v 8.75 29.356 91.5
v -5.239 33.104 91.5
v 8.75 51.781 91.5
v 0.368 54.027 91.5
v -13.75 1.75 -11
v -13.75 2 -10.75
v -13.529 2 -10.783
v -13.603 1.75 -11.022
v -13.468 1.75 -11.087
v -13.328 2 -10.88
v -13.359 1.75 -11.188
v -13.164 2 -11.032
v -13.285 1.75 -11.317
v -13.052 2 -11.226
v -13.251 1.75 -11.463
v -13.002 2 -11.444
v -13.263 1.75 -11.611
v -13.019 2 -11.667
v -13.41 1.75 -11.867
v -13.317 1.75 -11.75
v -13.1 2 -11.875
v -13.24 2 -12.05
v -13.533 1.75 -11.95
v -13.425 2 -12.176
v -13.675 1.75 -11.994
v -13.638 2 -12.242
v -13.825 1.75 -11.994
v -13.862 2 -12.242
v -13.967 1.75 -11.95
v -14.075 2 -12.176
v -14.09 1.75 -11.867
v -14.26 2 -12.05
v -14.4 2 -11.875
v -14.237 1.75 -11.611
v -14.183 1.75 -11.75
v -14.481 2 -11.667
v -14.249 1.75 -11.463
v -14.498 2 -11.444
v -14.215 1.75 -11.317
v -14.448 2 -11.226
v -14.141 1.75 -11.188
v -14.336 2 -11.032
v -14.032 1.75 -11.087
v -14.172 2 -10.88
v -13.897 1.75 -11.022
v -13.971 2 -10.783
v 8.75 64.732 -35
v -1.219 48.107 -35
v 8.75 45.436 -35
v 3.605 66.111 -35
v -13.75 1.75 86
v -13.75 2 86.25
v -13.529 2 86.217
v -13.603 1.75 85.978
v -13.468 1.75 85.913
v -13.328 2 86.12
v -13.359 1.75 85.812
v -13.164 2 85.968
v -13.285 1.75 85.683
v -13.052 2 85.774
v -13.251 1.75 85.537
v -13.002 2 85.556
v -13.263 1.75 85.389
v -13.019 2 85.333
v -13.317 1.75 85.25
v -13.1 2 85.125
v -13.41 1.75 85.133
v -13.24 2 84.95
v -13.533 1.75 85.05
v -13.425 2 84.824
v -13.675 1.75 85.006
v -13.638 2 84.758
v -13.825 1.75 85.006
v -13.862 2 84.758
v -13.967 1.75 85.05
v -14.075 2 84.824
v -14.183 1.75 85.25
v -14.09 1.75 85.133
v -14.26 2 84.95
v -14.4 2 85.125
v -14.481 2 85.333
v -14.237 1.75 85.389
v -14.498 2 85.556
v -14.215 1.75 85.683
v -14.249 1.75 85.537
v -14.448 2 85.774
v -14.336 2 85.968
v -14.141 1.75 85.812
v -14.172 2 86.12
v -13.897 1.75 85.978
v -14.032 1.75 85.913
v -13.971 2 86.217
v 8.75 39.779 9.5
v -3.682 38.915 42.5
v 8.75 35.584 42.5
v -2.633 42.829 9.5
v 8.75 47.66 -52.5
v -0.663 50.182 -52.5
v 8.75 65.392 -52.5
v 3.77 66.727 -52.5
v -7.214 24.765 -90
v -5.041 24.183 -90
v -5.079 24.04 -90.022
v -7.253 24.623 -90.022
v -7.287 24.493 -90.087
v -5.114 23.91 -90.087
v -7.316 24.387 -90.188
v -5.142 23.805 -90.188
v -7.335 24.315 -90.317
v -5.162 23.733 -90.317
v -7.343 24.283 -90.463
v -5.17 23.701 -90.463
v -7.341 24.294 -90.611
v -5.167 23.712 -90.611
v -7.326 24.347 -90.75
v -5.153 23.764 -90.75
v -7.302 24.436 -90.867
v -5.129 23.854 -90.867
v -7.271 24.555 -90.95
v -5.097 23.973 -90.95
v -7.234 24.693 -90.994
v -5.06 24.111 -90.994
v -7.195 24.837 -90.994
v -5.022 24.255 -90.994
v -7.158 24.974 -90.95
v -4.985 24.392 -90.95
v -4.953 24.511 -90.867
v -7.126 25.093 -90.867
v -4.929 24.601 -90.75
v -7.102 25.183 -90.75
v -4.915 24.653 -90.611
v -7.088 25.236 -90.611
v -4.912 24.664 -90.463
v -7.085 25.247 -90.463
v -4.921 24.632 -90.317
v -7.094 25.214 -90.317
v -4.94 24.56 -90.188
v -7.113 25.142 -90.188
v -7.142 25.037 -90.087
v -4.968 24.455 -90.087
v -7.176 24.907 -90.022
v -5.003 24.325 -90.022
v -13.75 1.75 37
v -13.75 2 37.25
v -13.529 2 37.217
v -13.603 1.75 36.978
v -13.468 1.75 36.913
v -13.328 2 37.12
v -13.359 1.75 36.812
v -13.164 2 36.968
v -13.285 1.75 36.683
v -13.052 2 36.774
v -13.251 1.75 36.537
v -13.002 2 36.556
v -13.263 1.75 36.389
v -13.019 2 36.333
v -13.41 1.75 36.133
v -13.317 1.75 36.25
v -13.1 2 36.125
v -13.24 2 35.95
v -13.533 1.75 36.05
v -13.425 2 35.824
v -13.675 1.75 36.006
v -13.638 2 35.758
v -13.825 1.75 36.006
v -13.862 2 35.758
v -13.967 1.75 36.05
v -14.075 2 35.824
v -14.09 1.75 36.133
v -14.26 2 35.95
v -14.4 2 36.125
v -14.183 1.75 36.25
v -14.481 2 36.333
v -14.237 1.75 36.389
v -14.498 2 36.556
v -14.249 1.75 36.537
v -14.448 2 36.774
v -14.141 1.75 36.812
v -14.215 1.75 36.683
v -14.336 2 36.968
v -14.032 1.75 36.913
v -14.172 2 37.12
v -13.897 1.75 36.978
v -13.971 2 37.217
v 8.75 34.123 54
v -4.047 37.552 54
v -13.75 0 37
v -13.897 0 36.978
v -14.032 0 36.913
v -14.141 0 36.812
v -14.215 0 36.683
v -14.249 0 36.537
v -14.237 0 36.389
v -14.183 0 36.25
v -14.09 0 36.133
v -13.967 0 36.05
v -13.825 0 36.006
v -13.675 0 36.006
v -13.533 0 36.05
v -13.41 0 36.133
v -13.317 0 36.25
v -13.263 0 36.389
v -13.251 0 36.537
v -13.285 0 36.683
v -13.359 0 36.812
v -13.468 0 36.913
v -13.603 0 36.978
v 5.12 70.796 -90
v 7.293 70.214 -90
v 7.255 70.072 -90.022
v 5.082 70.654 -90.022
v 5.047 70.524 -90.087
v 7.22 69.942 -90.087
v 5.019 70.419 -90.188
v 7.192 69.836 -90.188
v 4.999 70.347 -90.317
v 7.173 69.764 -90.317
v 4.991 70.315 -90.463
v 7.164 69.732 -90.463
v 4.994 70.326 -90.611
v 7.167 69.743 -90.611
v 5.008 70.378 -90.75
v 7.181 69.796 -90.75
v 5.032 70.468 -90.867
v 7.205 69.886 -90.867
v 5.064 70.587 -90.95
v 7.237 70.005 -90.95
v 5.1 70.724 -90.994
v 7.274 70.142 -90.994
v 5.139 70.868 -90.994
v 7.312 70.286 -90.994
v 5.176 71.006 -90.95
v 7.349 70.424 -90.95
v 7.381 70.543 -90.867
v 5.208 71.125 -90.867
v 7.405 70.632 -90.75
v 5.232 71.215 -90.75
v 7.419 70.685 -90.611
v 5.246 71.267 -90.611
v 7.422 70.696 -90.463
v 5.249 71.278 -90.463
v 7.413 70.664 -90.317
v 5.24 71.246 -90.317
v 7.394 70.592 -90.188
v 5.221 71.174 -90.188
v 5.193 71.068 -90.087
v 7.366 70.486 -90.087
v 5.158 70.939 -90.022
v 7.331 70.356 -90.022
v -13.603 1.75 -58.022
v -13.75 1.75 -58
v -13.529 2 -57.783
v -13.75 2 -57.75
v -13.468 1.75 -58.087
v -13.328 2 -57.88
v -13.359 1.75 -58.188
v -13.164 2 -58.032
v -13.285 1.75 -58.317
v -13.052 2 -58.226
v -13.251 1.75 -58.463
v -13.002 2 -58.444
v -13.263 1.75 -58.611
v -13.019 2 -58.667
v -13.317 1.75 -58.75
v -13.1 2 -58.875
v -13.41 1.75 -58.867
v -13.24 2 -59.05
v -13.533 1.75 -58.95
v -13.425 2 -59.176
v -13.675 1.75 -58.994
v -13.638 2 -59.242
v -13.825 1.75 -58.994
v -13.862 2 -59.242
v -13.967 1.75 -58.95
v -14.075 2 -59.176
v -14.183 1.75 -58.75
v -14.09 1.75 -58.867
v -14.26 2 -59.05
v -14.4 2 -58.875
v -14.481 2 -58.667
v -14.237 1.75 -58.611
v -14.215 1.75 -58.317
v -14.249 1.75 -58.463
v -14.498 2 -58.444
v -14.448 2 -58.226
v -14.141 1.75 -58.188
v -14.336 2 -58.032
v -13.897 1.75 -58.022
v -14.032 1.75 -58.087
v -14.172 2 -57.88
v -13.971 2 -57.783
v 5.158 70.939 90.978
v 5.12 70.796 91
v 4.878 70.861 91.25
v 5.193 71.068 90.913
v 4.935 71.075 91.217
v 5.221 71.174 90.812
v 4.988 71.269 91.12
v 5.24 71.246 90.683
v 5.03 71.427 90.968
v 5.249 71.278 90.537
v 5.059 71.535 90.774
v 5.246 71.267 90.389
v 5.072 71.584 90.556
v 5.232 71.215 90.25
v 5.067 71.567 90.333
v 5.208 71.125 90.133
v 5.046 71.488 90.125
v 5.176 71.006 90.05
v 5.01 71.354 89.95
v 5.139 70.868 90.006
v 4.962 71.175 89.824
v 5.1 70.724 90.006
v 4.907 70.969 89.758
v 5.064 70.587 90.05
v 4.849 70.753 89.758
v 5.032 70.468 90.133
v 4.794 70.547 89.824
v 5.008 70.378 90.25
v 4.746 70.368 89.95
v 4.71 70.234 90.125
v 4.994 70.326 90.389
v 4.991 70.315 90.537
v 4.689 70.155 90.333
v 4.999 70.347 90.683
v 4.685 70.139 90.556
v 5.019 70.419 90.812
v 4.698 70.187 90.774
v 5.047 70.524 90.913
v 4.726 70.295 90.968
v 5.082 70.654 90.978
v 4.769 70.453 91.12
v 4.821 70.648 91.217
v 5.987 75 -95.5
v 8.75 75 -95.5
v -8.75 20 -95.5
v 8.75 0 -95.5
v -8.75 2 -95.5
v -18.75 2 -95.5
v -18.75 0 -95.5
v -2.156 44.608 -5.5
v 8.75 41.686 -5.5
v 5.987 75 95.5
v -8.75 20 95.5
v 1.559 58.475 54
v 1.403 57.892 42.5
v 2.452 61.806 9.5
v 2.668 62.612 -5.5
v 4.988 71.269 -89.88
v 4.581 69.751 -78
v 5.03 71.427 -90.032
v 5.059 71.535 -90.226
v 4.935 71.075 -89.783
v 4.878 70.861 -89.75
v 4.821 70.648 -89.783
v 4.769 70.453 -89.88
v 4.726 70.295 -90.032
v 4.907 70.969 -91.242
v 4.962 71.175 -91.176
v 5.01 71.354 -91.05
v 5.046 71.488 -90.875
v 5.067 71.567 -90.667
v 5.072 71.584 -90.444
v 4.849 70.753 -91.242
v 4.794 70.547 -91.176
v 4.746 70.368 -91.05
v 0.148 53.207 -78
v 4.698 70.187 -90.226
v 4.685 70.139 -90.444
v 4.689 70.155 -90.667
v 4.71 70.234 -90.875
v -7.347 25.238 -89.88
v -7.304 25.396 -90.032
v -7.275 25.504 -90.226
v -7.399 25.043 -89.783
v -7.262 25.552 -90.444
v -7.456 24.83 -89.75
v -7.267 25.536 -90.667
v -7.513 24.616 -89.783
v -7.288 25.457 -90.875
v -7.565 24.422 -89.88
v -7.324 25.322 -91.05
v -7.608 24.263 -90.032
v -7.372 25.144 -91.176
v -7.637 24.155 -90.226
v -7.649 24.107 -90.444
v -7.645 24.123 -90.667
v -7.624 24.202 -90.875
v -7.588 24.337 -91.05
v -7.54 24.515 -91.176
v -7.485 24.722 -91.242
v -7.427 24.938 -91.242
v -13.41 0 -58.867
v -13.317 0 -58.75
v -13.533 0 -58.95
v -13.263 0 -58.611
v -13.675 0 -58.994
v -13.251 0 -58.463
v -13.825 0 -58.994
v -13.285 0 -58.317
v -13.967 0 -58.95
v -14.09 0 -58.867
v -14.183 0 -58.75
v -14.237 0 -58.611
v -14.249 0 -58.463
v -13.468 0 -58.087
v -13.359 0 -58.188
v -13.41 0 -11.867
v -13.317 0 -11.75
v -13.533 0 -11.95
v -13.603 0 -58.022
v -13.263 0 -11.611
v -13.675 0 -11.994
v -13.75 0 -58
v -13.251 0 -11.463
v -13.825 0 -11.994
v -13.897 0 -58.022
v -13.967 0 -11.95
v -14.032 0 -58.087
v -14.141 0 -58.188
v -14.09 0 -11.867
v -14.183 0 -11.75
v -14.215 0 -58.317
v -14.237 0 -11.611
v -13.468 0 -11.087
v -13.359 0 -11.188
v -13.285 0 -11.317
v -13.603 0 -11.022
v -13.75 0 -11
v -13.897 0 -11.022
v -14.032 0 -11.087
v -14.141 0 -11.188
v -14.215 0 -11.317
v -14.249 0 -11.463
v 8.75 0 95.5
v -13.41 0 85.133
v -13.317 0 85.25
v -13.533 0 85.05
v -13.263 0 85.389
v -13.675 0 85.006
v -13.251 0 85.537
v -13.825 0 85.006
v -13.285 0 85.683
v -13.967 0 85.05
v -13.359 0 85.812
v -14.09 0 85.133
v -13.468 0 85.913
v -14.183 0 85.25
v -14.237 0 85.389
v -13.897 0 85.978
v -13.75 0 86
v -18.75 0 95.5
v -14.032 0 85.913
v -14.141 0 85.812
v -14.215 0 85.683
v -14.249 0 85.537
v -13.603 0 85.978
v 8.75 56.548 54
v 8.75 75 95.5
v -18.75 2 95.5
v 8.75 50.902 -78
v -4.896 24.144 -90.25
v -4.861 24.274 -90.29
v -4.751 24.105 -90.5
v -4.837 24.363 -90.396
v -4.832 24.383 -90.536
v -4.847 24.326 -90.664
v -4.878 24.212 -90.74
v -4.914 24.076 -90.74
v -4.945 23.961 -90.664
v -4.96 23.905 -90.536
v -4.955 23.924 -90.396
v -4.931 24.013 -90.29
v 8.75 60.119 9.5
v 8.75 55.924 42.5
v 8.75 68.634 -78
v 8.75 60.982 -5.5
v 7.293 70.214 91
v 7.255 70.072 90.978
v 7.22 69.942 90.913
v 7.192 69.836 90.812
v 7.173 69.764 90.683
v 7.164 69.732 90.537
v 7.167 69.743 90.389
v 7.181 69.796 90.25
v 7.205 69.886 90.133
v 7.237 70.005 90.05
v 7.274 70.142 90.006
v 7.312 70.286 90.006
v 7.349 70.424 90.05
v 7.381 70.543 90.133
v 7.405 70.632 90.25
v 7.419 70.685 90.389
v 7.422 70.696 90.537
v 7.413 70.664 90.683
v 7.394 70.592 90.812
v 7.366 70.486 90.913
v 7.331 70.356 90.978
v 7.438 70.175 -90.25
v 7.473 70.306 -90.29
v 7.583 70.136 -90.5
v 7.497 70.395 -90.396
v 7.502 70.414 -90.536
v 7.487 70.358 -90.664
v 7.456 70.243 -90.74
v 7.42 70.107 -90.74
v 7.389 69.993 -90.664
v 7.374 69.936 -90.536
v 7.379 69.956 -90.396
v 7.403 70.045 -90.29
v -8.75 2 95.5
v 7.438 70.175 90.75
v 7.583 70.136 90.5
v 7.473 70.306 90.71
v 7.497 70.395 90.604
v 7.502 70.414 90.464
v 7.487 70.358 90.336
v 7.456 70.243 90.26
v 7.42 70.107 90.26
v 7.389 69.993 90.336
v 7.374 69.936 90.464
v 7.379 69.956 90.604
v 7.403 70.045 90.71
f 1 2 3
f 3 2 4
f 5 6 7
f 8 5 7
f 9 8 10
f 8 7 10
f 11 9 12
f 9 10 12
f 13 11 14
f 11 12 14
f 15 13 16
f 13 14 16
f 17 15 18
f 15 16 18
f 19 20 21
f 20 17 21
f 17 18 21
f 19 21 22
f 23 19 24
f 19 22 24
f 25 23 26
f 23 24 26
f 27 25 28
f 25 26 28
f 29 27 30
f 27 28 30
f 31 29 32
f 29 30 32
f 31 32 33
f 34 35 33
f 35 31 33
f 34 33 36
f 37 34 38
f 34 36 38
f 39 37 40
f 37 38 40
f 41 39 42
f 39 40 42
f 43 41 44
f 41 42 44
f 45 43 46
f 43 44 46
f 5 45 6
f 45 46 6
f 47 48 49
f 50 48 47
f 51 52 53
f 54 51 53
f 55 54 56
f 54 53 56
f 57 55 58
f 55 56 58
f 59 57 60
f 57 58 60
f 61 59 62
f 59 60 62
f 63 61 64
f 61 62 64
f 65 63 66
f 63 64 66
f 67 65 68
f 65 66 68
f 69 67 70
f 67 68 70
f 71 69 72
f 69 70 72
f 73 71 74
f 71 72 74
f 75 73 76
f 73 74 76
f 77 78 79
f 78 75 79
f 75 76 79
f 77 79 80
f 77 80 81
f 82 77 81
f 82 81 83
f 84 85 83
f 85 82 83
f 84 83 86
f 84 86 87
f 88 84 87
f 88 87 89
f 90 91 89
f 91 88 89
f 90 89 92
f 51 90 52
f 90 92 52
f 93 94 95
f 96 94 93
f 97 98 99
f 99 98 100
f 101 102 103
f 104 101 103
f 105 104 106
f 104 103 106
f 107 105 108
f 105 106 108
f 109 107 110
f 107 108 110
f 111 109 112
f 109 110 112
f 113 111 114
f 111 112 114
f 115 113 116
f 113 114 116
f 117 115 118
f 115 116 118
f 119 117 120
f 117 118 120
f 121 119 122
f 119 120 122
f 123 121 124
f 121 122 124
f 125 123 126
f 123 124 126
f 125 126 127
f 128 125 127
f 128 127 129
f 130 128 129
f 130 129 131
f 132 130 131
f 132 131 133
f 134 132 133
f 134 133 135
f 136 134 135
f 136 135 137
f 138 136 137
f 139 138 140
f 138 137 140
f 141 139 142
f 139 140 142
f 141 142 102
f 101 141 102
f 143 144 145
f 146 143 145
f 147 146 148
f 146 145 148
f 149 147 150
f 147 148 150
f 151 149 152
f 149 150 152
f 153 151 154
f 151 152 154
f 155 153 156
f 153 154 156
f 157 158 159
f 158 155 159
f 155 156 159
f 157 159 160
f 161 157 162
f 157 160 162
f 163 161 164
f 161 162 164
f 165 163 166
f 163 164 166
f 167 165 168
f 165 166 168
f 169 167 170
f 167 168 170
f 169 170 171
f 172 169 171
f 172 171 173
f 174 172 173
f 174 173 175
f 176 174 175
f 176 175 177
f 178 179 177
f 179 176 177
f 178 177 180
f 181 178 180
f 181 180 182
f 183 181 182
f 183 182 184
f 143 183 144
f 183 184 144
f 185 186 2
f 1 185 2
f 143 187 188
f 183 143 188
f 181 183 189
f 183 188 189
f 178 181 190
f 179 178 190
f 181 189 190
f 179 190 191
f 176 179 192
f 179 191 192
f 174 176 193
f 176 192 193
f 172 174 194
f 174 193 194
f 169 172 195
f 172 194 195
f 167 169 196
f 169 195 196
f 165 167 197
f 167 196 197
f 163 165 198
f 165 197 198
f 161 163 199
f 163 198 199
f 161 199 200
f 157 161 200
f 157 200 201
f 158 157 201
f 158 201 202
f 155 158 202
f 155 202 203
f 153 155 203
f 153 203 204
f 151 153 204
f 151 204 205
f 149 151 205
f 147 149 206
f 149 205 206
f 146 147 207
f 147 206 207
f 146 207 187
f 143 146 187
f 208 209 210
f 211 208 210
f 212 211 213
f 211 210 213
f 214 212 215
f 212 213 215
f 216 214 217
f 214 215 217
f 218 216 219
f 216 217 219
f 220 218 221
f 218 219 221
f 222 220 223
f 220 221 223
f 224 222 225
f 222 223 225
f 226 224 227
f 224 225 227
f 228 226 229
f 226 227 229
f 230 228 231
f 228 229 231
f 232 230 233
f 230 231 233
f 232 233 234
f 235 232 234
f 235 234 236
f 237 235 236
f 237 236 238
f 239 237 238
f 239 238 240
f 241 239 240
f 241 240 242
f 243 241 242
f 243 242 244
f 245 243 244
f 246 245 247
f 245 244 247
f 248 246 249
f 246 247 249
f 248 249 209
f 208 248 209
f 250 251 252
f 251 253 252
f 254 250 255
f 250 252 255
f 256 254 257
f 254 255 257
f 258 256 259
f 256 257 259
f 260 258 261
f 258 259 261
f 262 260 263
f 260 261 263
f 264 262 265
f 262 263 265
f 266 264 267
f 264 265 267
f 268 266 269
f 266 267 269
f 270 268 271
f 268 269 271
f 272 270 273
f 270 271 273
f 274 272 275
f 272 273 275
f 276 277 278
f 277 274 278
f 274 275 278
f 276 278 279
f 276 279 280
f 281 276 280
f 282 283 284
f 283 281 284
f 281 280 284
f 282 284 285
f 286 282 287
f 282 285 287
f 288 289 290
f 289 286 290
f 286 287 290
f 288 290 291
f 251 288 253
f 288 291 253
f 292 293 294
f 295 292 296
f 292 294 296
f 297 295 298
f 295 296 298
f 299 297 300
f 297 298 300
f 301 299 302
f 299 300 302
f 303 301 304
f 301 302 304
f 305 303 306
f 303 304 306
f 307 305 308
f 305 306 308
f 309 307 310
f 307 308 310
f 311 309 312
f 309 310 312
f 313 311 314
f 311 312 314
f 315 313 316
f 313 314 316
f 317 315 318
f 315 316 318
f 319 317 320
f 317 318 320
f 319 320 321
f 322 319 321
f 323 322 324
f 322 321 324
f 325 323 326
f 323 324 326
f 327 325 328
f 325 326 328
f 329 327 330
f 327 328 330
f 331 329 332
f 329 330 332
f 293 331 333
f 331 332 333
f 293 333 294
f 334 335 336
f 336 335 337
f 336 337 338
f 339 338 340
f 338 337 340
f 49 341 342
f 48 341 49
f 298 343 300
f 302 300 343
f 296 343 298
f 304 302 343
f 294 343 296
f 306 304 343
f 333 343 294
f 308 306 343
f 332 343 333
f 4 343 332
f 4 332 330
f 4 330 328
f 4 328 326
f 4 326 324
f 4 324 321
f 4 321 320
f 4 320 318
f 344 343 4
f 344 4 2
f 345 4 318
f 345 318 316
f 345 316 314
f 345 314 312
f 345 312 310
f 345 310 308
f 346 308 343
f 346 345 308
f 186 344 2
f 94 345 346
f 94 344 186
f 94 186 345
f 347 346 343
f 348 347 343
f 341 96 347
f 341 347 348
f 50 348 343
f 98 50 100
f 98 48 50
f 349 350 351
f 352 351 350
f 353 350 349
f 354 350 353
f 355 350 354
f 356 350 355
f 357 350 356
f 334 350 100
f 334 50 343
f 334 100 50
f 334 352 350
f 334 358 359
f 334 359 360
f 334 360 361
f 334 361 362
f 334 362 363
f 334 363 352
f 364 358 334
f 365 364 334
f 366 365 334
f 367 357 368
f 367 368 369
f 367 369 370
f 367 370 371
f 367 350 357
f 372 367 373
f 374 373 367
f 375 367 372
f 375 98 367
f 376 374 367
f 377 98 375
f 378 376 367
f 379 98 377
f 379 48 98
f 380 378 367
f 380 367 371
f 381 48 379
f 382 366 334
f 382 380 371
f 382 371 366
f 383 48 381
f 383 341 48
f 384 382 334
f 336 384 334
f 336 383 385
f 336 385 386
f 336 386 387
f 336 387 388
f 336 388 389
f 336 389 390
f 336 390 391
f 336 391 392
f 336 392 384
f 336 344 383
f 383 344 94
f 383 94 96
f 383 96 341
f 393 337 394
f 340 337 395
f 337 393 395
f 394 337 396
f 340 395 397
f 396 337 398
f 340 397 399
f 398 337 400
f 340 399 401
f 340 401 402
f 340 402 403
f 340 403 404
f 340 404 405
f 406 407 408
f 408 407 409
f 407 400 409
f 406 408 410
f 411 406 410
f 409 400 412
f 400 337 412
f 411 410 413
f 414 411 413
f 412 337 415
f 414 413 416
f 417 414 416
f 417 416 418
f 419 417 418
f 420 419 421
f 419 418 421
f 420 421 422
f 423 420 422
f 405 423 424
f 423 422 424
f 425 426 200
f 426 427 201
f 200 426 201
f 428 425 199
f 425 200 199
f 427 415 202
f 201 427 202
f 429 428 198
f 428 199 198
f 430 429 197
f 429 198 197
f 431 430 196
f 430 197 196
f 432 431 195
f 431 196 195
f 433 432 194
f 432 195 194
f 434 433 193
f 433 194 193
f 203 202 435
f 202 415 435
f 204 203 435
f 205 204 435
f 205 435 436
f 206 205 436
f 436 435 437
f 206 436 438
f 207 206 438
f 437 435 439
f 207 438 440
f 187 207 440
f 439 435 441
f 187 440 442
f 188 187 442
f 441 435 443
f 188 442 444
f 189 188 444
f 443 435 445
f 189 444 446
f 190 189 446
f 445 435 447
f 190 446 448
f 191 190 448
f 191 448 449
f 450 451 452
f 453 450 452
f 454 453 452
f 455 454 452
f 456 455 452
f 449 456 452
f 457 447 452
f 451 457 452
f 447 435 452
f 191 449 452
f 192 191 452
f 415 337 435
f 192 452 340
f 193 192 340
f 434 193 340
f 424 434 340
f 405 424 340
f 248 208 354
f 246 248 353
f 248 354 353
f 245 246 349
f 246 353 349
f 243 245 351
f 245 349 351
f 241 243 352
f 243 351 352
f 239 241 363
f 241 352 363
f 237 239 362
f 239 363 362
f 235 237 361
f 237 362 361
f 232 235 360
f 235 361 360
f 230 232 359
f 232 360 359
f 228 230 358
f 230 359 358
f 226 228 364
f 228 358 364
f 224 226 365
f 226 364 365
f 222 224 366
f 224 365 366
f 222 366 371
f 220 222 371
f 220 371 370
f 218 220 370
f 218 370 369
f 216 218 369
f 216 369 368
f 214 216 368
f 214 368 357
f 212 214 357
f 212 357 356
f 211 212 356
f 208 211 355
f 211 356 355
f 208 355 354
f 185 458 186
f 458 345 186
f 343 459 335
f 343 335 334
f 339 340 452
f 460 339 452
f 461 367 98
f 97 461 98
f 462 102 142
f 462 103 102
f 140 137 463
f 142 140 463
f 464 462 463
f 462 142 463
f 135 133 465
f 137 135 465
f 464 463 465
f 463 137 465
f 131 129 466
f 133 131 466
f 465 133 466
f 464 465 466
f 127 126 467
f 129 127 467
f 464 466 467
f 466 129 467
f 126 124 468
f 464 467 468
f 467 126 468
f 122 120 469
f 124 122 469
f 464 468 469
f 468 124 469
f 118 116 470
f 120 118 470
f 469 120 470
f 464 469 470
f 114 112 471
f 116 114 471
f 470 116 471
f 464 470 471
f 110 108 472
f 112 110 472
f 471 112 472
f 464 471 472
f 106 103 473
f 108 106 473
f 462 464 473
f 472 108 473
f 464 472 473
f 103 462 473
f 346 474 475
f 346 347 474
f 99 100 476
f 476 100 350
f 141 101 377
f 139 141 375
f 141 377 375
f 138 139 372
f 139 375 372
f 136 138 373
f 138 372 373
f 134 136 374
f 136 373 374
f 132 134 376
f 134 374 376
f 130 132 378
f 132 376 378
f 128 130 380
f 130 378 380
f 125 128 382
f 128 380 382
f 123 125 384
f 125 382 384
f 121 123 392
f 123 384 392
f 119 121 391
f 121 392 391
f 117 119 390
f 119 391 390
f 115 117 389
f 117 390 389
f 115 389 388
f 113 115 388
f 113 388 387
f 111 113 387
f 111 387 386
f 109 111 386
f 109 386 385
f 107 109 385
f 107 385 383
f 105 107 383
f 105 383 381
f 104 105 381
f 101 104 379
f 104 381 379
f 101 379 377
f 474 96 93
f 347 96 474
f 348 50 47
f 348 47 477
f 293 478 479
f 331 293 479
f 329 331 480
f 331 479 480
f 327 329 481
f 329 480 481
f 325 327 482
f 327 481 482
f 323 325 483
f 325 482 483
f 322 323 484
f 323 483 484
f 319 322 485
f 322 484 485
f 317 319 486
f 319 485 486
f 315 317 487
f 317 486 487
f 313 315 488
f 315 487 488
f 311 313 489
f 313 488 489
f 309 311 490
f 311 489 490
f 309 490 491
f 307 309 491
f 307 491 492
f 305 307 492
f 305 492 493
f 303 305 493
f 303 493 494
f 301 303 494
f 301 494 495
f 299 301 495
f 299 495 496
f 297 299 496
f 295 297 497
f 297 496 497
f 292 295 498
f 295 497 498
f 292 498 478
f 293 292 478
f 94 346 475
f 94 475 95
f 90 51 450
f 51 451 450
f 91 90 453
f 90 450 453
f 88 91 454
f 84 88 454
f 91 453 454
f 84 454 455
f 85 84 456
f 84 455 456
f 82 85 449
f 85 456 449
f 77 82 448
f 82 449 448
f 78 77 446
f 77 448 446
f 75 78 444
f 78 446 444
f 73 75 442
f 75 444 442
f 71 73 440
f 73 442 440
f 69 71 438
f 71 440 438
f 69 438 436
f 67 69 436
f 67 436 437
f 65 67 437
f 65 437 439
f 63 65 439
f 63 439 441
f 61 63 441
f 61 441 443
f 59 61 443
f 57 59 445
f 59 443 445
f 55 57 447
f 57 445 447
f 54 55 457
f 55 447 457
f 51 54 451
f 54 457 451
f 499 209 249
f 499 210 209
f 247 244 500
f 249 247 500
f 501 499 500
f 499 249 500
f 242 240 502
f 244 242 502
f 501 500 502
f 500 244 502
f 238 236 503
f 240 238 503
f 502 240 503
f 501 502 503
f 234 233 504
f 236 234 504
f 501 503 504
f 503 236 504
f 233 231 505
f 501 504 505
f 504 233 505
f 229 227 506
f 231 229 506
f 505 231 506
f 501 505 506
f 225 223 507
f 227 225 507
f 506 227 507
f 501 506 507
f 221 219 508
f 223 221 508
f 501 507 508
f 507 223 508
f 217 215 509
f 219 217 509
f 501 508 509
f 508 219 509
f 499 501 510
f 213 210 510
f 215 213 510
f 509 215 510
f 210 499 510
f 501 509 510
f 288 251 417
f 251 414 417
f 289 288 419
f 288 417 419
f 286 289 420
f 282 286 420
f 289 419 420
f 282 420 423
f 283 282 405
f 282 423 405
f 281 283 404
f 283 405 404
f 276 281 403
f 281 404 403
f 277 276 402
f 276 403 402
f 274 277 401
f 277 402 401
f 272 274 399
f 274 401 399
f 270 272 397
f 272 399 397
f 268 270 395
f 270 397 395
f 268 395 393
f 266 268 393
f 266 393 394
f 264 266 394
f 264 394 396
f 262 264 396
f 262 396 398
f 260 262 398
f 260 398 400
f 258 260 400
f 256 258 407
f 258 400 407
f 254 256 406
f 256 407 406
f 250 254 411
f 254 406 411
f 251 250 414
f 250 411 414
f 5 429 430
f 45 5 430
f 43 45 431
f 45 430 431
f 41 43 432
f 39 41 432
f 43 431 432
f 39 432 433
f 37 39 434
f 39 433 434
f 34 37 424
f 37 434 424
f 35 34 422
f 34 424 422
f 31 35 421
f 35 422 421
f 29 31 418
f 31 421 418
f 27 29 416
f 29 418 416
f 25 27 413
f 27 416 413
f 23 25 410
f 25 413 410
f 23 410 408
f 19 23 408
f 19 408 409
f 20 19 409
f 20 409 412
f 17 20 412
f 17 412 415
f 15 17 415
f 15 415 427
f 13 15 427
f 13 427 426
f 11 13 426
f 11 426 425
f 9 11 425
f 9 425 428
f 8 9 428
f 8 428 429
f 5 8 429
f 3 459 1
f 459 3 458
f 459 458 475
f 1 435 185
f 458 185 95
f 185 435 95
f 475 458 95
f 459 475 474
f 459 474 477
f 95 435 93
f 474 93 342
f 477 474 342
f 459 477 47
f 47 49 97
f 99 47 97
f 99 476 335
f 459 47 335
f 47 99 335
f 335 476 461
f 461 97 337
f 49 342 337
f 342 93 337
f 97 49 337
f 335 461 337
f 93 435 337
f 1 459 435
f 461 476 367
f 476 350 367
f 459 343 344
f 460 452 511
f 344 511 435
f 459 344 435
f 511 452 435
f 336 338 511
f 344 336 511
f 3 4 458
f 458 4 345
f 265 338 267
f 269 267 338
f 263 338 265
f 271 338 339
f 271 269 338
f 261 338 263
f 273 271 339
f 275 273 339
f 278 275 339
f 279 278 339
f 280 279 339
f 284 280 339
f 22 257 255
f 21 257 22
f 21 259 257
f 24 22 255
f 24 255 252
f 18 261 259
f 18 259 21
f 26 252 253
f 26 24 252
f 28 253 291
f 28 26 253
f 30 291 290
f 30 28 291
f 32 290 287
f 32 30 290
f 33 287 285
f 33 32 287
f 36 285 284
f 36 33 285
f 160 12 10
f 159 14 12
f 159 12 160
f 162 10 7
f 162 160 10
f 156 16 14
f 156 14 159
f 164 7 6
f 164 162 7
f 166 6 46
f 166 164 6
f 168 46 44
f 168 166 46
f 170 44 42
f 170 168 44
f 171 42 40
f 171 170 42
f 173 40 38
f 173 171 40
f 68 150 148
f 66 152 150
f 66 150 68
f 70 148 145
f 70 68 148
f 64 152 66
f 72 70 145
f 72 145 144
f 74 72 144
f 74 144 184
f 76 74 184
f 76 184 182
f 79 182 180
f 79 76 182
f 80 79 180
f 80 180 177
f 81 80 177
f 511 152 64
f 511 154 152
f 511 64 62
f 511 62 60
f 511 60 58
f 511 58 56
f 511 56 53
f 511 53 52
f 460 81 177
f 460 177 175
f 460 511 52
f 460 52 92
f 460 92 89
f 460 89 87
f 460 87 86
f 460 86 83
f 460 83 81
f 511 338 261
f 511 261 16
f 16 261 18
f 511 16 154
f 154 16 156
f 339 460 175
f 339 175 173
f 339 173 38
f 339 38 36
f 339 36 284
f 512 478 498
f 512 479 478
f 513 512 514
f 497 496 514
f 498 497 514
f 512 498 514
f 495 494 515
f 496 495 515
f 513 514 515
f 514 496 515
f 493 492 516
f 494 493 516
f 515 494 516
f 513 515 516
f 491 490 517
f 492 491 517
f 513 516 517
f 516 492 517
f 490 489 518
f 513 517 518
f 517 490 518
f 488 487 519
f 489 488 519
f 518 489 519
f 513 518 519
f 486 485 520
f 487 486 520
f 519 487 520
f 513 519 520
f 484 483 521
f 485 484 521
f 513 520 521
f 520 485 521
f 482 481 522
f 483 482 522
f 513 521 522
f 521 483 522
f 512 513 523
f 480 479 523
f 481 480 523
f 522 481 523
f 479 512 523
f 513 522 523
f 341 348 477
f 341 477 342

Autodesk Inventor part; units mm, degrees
ref_plane "YZ Plane" through (0, 0, 0) normal (1, 0, 0) x (0, 1, 0)
ref_plane "XZ Plane" through (0, 0, 0) normal (0, 1, 0) x (-1, 0, 0)
sketch "Эскиз1" plane through (0, 0, 0) normal (0, 1, 0) x (-1, 0, 0)
  line L0 (8.75, 95.5) -> (-8.75, 95.5)
  line L1 (-8.75, 95.5) -> (-8.75, -95.5)
  line L2 (-8.75, -95.5) -> (8.75, -95.5)
  line L3 (8.75, -95.5) -> (8.75, 95.5)
  line L4 (8.75, -95.5) -> (-8.75, 95.5) construction
  line L5 (-8.75, -95.5) -> (8.75, 95.5) construction
  point P0 (0, 0)
  point P1 (0, 0)
  dimension "d0" = 17.5
  dimension "d1" = 191
extrude "Выдавливание1" add sketch "Эскиз1" along normal blind 75
sketch "Эскиз2" plane through (-8.75, 0, -95.5) normal (-1, 0, 0) x (0, 0, 1)
  line L0 (191, 0) -> (191, 75) construction
  line L1 (191, 20) -> (0, 20)
  line L2 (0, 0) -> (0, 75) construction
  line L3 (0, 0) -> (191, 0) construction
  point P0 (95.5, 0)
  dimension "d4" = 20
ref_plane "РабПлоскость1" through (-8.75, 20, 95.5) normal (-0.9659258, 0.258819, 0) x (0, 0, -1)
split "Разделение1" plane through (-8.75, 20, 95.5) removes the side toward (-0.9659258, 0.258819, 0)
sketch "Эскиз3" plane through (5.9872, 75, -95.5) normal (-0.9659258, 0.258819, 0) x (0, 0, 1)
  line L0 (0, -56.9402) -> (0, 0) construction
  line L1 (0, 0) -> (191, 0) construction
  line L2 (191, 0) -> (191, -56.9402) construction
  line L3 (191, -56.9402) -> (0, -56.9402) construction
  line L4 (191, -71.7294) -> (191, 0.7151) construction
  line L5 (191, -53.9402) -> (0, -30.4883) construction
  line L6 (0, -71.7294) -> (0, 0.7151) construction
  line L7 (17.5, -22.562) -> (43, -25.693)
  line L8 (43, -25.693) -> (43, -8.5653)
  line L9 (43, -8.5653) -> (17.5, -5.4343)
  line L10 (17.5, -5.4343) -> (17.5, -22.562)
  line L11 (47, 0) -> (47, -56.9402) construction
  line L12 (191, -56.9402) -> (0, -56.9402) construction
  line L13 (94, 0) -> (94, -56.9402) construction
  line L14 (142, 0) -> (142, -56.9402) construction
  line L15 (43, -8.5653) -> (47, -8.5653) construction
  line L16 (60.5, -27.8417) -> (60.5, -9.2028)
  line L17 (60.5, -9.2028) -> (90, -12.8249)
  line L18 (90, -12.8249) -> (90, -31.4639)
  line L19 (90, -31.4639) -> (60.5, -27.8417)
  line L20 (90, -12.8249) -> (94, -12.8249) construction
  line L21 (105, -33.3056) -> (105, -13.6592)
  line L22 (105, -13.6592) -> (138, -17.7111)
  line L23 (138, -17.7111) -> (138, -37.3575)
  line L24 (138, -37.3575) -> (105, -33.3056)
  line L25 (138, -17.7111) -> (142, -17.7111) construction
  line L26 (149.5, -17.1081) -> (149.5, -38.7695)
  line L27 (149.5, -38.7695) -> (187, -43.374)
  line L28 (187, -43.374) -> (187, -21.7125)
  line L29 (187, -21.7125) -> (149.5, -17.1081)
  line L30 (187, -21.7125) -> (191, -21.7125) construction
  point P0 (95.5, -73.994)
  dimension "d6" = 3
  dimension "d7" = 7
  dimension "d8" = 10
  dimension "d9" = 25.5
  dimension "d10" = 27
  dimension "d11" = 4
  dimension "d12" = 29.5
  dimension "d13" = 28.5
  dimension "d14" = 33
  dimension "d15" = 29.5
  dimension "d16" = 37.5
  dimension "d17" = 31.5
  dimension "d36" = 49
  dimension "d37" = 48
  dimension "d38" = 47
extrude "Выдавливание2" cut sketch "Эскиз3" against normal through all
sketch "Эскиз5" plane through (0, 0, 0) normal (0, 1, 0) x (-1, 0, 0)
  line L0 (8.75, -95.5) -> (-8.75, -95.5) construction
  line L1 (-8.75, -95.5) -> (-8.75, 95.5) construction
  line L2 (-8.75, 95.5) -> (8.75, 95.5) construction
  line L3 (8.75, 95.5) -> (8.75, -95.5) projected
  line L4 (8.75, -95.5) -> (18.75, -95.5)
  line L5 (18.75, -95.5) -> (18.75, 85.5)
  line L6 (18.75, 95.5) -> (8.75, 95.5)
  line L7 (8.75, 95.5) -> (8.75, -95.5) construction
  line L8 (18.75, 85.5) -> (18.75, 95.5)
  line L9 (24.25, 0) -> (-14.25, 0) construction
  point P0 (0, 0)
  point P1 (8.75, 95.5)
  dimension "d26" = 10
extrude "Выдавливание5" add sketch "Эскиз5" along normal blind 2
sketch "Эскиз4" plane through (5.9872, 75, -95.5) normal (-0.9659258, 0.258819, 0) x (0, 0, 1)
  line L0 (191, 0.7151) -> (0, 0.7151) construction
  line L1 (95.5, 0.7151) -> (95.5, -56.9402) construction
  line L2 (191, -56.9402) -> (0, -56.9402) construction
  line L3 (191, -71.7294) -> (191, 0.7151) construction
  line L4 (0, -71.7294) -> (0, 0.7151) construction
  line L5 (191, -28.1126) -> (0, -28.1126) construction
  line L6 (191, -76.2587) -> (191, -56.9402) construction
  circle A0 centre (5, -51.9402) radius 0.5
  circle A1 centre (5, -4.2849) radius 0.5
  line L7 (0, -56.9402) -> (0, 0) projected
  line L8 (0, -56.9402) -> (10, -56.9402)
  line L9 (10, -56.9402) -> (10, -46.9402)
  line L10 (10, -46.9402) -> (0, -46.9402)
  line L11 (0, -46.9402) -> (0, -56.9402)
  line L12 (10, -56.9402) -> (0, -46.9402) construction
  line L13 (0, -56.9402) -> (10, -46.9402) construction
  circle A2 centre (186, -4.2849) radius 0.5
  point P0 (95.5, -73.994)
  point P1 (95.5, -28.1126)
  dimension "d46" = 10
  dimension "d47" = 1
hole "Отверстие1" at (-7.4559, 24.8296, -90.5) at (4.8782, 70.8611, -90.5) at (4.8782, 70.8611, 90.5) direction (0.9659258, -0.258819, 0) diameter 1 depth 2.5 tip angle 118 countersink diameter 1.5 countersink angle 90
sketch "Эскиз6" plane through (0, 2, 0) normal (0, 1, 0) x (1, 0, 0)
  line L0 (-8.75, -95.5) -> (-8.75, 95.5) construction
  line L1 (-18.75, 95.5) -> (-8.75, 95.5) construction
  line L2 (-18.75, -95.5) -> (-18.75, 95.5) construction
  line L3 (-8.75, -95.5) -> (-18.75, -95.5) construction
  line L4 (8.75, -95.5) -> (-8.75, -95.5) construction
  line L5 (8.75, 95.5) -> (8.75, -95.5) construction
  line L6 (-8.75, 95.5) -> (8.75, 95.5) construction
  line L7 (-8.75, -95.5) -> (-18.75, -95.5) construction
  line L8 (-18.75, -95.5) -> (-18.75, -85.5) construction
  line L9 (-18.75, -85.5) -> (-8.75, -85.5) construction
  line L10 (-8.75, -85.5) -> (-8.75, -95.5) construction
  circle A0 centre (-13.75, -85.5) radius 0.5
  circle A1 centre (-13.75, -36.5) radius 0.5
  circle A2 centre (-13.75, 11.5) radius 0.5
  circle A3 centre (-13.75, 58.5) radius 0.5
  point P0 (0, 0)
  dimension "d50" = 1
  dimension "d51" = 49
  dimension "d52" = 48
  dimension "d53" = 47
hole "Отверстие2" at (-13.75, 2, -58.5) at (-13.75, 2, -11.5) at (-13.75, 2, 36.5) at (-13.75, 2, 85.5) direction (0, -1, 0) diameter 1 end through all countersink diameter 1.5 countersink angle 90
properties part number "SortBoard-Frame"
